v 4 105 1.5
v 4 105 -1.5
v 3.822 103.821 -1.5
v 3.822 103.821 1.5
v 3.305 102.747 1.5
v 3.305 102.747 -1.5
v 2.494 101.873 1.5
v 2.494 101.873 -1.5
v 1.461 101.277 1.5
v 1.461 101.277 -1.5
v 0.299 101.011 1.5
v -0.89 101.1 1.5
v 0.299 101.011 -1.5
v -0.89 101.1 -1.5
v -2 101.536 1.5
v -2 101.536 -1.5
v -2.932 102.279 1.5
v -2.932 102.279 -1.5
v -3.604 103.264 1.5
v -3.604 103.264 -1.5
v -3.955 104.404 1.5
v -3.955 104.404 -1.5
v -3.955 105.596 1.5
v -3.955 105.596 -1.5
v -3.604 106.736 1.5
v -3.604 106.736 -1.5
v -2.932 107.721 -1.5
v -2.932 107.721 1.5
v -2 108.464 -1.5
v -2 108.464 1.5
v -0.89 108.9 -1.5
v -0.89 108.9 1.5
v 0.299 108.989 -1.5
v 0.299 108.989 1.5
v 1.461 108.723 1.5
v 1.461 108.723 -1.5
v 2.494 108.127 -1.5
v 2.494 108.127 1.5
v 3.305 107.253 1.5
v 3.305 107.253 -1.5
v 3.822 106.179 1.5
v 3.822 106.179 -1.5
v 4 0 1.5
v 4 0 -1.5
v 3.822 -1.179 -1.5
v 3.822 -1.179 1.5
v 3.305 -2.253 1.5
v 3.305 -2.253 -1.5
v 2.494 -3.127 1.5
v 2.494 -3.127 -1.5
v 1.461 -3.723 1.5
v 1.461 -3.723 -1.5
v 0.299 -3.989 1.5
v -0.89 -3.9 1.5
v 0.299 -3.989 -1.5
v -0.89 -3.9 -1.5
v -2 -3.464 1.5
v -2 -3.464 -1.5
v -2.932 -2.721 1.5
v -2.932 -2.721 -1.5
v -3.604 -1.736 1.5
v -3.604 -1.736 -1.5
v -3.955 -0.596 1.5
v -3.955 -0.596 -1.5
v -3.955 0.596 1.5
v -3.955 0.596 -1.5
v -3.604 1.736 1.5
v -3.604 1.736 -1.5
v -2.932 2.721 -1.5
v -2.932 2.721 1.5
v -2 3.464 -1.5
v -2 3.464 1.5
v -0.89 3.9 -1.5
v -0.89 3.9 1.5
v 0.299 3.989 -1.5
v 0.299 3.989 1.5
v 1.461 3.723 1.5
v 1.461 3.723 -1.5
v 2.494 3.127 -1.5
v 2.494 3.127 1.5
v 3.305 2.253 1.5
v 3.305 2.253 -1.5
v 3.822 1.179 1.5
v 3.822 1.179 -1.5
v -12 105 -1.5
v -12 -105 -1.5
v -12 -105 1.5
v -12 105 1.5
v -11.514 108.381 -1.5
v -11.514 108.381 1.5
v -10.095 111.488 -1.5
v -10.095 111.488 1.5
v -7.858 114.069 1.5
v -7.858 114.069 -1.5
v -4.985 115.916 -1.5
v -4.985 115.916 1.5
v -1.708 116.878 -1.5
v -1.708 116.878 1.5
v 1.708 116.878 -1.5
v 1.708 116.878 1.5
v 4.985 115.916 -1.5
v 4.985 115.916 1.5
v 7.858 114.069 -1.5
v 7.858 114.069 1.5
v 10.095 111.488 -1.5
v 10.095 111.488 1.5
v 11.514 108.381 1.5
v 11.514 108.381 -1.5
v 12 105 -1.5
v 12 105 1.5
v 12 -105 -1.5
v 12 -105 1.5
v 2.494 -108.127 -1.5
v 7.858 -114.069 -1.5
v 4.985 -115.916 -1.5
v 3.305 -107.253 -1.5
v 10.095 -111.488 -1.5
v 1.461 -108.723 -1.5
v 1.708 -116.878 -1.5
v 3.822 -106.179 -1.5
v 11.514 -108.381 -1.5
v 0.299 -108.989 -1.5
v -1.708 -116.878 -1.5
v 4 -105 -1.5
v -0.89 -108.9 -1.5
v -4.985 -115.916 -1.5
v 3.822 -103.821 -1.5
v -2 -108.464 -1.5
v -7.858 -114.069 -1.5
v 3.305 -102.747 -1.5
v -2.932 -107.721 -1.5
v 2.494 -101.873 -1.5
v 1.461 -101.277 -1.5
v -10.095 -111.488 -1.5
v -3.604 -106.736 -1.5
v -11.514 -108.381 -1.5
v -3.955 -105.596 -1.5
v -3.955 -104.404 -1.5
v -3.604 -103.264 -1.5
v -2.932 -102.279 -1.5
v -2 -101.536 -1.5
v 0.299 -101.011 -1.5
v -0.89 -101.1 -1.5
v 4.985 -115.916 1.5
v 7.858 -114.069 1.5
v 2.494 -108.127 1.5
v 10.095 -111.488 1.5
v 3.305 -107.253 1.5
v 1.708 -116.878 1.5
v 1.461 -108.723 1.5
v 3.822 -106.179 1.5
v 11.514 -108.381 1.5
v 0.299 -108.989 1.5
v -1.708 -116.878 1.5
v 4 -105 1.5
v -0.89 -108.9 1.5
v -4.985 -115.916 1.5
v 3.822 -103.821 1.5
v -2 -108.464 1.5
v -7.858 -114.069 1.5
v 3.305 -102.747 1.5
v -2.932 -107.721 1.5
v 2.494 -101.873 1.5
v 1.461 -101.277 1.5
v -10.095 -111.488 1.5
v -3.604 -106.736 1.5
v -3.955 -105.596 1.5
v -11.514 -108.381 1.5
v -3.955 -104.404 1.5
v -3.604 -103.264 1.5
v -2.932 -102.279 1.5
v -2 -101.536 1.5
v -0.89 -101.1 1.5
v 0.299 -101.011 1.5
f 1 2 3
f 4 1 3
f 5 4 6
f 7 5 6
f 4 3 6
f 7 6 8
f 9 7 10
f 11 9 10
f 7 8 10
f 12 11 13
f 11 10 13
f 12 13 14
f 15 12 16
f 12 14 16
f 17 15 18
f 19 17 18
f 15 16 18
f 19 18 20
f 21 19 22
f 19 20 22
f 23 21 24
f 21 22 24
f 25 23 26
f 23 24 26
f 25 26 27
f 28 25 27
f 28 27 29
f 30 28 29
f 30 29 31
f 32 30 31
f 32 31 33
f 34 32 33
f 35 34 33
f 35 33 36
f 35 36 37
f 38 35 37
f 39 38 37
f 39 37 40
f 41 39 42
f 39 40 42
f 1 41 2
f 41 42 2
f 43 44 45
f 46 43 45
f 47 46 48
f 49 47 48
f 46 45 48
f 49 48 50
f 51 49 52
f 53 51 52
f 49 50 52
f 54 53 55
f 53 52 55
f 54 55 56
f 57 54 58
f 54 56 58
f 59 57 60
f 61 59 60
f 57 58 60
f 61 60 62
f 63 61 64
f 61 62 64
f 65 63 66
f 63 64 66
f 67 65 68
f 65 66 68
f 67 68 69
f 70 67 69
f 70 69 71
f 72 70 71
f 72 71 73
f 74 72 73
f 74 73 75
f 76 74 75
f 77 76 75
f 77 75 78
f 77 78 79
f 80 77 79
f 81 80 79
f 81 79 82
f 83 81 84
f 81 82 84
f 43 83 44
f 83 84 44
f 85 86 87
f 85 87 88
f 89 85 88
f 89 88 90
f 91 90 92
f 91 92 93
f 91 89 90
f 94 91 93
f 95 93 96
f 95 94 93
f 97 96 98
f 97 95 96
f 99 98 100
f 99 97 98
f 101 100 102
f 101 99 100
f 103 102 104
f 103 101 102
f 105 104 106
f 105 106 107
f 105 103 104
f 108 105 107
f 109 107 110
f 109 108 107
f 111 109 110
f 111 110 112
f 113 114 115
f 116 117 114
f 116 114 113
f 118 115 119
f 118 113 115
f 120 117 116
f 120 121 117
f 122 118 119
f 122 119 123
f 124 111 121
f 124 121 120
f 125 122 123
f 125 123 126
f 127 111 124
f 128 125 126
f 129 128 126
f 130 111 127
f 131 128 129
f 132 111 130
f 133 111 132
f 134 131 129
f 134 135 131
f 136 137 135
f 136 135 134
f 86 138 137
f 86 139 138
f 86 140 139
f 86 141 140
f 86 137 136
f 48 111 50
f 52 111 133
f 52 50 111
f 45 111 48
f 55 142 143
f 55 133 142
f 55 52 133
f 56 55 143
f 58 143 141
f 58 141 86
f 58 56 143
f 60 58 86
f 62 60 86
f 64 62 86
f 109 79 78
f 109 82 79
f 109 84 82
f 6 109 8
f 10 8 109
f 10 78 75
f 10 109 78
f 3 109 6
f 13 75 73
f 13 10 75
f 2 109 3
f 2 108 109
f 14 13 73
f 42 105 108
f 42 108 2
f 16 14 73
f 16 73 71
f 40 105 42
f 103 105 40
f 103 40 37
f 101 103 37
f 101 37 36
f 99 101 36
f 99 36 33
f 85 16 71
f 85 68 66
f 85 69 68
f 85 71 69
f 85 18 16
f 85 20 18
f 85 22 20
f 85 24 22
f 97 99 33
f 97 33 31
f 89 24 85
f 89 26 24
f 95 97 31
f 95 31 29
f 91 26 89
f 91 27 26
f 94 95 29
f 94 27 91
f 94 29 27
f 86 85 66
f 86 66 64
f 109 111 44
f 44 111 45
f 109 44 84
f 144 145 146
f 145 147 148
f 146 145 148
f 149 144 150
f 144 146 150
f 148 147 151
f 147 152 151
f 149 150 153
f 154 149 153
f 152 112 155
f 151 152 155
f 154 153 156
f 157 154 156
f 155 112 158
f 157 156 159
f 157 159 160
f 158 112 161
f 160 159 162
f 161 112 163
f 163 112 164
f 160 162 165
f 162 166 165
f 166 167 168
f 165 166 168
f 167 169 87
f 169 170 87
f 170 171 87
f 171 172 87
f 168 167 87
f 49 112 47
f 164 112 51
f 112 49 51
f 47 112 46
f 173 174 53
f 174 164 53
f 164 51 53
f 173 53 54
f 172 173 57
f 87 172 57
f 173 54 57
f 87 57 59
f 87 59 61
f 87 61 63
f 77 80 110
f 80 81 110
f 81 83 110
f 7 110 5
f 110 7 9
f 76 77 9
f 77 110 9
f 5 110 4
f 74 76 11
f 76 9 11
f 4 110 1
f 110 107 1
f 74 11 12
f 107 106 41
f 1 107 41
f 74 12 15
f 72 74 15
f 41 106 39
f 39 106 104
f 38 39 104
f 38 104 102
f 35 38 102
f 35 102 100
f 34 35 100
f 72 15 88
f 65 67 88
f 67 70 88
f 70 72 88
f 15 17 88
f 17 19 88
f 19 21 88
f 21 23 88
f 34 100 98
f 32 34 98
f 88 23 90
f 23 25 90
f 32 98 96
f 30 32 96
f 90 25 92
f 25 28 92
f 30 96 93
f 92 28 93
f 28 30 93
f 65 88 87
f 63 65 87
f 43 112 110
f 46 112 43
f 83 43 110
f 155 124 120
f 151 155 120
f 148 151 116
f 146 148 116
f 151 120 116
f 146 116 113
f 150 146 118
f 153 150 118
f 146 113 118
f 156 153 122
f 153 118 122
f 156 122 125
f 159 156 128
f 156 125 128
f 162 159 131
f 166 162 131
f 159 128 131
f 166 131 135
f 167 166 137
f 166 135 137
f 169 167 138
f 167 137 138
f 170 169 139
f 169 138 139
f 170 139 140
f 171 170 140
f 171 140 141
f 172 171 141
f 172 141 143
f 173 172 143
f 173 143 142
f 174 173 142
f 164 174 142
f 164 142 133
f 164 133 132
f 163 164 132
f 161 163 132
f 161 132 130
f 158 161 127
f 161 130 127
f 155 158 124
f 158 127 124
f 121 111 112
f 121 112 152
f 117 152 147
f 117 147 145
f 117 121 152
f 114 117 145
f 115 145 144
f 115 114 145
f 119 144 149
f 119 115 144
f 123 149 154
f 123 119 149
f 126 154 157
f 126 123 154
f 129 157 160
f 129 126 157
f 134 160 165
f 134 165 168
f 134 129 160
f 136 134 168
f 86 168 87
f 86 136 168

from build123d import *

# Parameters (mm, degrees)
IZIM1_R                     = 4
Y_KSEKLIK_EKSTR_ZYON1_DEPTH = 3


with BuildPart() as part:
    # Çizim1 → Yükseklik-Ekstrüzyon1 (new body)
    with BuildSketch(Plane(origin=(0, 0, -1.5), x_dir=(-1, 0, 0), z_dir=(0, 0, -1))):
        with BuildLine():
            Line((12, -105), (12, 105))
            ThreePointArc((12, 105), (0, 117), (-12, 105))
            Line((-12, 105), (-12, -105))
            ThreePointArc((-12, -105), (0, -117), (12, -105))
        make_face()
        with Locations(Location((0, -105, 0), (0, 0, 180))):
            Circle(IZIM1_R, mode=Mode.SUBTRACT)
        with Locations(Location((0, 0, 0), (0, 0, 180))):
            Circle(IZIM1_R, mode=Mode.SUBTRACT)
        with Locations(Location((0, 105, 0), (0, 0, 180))):
            Circle(IZIM1_R, mode=Mode.SUBTRACT)
    extrude(amount=-Y_KSEKLIK_EKSTR_ZYON1_DEPTH)


solid = part.part
